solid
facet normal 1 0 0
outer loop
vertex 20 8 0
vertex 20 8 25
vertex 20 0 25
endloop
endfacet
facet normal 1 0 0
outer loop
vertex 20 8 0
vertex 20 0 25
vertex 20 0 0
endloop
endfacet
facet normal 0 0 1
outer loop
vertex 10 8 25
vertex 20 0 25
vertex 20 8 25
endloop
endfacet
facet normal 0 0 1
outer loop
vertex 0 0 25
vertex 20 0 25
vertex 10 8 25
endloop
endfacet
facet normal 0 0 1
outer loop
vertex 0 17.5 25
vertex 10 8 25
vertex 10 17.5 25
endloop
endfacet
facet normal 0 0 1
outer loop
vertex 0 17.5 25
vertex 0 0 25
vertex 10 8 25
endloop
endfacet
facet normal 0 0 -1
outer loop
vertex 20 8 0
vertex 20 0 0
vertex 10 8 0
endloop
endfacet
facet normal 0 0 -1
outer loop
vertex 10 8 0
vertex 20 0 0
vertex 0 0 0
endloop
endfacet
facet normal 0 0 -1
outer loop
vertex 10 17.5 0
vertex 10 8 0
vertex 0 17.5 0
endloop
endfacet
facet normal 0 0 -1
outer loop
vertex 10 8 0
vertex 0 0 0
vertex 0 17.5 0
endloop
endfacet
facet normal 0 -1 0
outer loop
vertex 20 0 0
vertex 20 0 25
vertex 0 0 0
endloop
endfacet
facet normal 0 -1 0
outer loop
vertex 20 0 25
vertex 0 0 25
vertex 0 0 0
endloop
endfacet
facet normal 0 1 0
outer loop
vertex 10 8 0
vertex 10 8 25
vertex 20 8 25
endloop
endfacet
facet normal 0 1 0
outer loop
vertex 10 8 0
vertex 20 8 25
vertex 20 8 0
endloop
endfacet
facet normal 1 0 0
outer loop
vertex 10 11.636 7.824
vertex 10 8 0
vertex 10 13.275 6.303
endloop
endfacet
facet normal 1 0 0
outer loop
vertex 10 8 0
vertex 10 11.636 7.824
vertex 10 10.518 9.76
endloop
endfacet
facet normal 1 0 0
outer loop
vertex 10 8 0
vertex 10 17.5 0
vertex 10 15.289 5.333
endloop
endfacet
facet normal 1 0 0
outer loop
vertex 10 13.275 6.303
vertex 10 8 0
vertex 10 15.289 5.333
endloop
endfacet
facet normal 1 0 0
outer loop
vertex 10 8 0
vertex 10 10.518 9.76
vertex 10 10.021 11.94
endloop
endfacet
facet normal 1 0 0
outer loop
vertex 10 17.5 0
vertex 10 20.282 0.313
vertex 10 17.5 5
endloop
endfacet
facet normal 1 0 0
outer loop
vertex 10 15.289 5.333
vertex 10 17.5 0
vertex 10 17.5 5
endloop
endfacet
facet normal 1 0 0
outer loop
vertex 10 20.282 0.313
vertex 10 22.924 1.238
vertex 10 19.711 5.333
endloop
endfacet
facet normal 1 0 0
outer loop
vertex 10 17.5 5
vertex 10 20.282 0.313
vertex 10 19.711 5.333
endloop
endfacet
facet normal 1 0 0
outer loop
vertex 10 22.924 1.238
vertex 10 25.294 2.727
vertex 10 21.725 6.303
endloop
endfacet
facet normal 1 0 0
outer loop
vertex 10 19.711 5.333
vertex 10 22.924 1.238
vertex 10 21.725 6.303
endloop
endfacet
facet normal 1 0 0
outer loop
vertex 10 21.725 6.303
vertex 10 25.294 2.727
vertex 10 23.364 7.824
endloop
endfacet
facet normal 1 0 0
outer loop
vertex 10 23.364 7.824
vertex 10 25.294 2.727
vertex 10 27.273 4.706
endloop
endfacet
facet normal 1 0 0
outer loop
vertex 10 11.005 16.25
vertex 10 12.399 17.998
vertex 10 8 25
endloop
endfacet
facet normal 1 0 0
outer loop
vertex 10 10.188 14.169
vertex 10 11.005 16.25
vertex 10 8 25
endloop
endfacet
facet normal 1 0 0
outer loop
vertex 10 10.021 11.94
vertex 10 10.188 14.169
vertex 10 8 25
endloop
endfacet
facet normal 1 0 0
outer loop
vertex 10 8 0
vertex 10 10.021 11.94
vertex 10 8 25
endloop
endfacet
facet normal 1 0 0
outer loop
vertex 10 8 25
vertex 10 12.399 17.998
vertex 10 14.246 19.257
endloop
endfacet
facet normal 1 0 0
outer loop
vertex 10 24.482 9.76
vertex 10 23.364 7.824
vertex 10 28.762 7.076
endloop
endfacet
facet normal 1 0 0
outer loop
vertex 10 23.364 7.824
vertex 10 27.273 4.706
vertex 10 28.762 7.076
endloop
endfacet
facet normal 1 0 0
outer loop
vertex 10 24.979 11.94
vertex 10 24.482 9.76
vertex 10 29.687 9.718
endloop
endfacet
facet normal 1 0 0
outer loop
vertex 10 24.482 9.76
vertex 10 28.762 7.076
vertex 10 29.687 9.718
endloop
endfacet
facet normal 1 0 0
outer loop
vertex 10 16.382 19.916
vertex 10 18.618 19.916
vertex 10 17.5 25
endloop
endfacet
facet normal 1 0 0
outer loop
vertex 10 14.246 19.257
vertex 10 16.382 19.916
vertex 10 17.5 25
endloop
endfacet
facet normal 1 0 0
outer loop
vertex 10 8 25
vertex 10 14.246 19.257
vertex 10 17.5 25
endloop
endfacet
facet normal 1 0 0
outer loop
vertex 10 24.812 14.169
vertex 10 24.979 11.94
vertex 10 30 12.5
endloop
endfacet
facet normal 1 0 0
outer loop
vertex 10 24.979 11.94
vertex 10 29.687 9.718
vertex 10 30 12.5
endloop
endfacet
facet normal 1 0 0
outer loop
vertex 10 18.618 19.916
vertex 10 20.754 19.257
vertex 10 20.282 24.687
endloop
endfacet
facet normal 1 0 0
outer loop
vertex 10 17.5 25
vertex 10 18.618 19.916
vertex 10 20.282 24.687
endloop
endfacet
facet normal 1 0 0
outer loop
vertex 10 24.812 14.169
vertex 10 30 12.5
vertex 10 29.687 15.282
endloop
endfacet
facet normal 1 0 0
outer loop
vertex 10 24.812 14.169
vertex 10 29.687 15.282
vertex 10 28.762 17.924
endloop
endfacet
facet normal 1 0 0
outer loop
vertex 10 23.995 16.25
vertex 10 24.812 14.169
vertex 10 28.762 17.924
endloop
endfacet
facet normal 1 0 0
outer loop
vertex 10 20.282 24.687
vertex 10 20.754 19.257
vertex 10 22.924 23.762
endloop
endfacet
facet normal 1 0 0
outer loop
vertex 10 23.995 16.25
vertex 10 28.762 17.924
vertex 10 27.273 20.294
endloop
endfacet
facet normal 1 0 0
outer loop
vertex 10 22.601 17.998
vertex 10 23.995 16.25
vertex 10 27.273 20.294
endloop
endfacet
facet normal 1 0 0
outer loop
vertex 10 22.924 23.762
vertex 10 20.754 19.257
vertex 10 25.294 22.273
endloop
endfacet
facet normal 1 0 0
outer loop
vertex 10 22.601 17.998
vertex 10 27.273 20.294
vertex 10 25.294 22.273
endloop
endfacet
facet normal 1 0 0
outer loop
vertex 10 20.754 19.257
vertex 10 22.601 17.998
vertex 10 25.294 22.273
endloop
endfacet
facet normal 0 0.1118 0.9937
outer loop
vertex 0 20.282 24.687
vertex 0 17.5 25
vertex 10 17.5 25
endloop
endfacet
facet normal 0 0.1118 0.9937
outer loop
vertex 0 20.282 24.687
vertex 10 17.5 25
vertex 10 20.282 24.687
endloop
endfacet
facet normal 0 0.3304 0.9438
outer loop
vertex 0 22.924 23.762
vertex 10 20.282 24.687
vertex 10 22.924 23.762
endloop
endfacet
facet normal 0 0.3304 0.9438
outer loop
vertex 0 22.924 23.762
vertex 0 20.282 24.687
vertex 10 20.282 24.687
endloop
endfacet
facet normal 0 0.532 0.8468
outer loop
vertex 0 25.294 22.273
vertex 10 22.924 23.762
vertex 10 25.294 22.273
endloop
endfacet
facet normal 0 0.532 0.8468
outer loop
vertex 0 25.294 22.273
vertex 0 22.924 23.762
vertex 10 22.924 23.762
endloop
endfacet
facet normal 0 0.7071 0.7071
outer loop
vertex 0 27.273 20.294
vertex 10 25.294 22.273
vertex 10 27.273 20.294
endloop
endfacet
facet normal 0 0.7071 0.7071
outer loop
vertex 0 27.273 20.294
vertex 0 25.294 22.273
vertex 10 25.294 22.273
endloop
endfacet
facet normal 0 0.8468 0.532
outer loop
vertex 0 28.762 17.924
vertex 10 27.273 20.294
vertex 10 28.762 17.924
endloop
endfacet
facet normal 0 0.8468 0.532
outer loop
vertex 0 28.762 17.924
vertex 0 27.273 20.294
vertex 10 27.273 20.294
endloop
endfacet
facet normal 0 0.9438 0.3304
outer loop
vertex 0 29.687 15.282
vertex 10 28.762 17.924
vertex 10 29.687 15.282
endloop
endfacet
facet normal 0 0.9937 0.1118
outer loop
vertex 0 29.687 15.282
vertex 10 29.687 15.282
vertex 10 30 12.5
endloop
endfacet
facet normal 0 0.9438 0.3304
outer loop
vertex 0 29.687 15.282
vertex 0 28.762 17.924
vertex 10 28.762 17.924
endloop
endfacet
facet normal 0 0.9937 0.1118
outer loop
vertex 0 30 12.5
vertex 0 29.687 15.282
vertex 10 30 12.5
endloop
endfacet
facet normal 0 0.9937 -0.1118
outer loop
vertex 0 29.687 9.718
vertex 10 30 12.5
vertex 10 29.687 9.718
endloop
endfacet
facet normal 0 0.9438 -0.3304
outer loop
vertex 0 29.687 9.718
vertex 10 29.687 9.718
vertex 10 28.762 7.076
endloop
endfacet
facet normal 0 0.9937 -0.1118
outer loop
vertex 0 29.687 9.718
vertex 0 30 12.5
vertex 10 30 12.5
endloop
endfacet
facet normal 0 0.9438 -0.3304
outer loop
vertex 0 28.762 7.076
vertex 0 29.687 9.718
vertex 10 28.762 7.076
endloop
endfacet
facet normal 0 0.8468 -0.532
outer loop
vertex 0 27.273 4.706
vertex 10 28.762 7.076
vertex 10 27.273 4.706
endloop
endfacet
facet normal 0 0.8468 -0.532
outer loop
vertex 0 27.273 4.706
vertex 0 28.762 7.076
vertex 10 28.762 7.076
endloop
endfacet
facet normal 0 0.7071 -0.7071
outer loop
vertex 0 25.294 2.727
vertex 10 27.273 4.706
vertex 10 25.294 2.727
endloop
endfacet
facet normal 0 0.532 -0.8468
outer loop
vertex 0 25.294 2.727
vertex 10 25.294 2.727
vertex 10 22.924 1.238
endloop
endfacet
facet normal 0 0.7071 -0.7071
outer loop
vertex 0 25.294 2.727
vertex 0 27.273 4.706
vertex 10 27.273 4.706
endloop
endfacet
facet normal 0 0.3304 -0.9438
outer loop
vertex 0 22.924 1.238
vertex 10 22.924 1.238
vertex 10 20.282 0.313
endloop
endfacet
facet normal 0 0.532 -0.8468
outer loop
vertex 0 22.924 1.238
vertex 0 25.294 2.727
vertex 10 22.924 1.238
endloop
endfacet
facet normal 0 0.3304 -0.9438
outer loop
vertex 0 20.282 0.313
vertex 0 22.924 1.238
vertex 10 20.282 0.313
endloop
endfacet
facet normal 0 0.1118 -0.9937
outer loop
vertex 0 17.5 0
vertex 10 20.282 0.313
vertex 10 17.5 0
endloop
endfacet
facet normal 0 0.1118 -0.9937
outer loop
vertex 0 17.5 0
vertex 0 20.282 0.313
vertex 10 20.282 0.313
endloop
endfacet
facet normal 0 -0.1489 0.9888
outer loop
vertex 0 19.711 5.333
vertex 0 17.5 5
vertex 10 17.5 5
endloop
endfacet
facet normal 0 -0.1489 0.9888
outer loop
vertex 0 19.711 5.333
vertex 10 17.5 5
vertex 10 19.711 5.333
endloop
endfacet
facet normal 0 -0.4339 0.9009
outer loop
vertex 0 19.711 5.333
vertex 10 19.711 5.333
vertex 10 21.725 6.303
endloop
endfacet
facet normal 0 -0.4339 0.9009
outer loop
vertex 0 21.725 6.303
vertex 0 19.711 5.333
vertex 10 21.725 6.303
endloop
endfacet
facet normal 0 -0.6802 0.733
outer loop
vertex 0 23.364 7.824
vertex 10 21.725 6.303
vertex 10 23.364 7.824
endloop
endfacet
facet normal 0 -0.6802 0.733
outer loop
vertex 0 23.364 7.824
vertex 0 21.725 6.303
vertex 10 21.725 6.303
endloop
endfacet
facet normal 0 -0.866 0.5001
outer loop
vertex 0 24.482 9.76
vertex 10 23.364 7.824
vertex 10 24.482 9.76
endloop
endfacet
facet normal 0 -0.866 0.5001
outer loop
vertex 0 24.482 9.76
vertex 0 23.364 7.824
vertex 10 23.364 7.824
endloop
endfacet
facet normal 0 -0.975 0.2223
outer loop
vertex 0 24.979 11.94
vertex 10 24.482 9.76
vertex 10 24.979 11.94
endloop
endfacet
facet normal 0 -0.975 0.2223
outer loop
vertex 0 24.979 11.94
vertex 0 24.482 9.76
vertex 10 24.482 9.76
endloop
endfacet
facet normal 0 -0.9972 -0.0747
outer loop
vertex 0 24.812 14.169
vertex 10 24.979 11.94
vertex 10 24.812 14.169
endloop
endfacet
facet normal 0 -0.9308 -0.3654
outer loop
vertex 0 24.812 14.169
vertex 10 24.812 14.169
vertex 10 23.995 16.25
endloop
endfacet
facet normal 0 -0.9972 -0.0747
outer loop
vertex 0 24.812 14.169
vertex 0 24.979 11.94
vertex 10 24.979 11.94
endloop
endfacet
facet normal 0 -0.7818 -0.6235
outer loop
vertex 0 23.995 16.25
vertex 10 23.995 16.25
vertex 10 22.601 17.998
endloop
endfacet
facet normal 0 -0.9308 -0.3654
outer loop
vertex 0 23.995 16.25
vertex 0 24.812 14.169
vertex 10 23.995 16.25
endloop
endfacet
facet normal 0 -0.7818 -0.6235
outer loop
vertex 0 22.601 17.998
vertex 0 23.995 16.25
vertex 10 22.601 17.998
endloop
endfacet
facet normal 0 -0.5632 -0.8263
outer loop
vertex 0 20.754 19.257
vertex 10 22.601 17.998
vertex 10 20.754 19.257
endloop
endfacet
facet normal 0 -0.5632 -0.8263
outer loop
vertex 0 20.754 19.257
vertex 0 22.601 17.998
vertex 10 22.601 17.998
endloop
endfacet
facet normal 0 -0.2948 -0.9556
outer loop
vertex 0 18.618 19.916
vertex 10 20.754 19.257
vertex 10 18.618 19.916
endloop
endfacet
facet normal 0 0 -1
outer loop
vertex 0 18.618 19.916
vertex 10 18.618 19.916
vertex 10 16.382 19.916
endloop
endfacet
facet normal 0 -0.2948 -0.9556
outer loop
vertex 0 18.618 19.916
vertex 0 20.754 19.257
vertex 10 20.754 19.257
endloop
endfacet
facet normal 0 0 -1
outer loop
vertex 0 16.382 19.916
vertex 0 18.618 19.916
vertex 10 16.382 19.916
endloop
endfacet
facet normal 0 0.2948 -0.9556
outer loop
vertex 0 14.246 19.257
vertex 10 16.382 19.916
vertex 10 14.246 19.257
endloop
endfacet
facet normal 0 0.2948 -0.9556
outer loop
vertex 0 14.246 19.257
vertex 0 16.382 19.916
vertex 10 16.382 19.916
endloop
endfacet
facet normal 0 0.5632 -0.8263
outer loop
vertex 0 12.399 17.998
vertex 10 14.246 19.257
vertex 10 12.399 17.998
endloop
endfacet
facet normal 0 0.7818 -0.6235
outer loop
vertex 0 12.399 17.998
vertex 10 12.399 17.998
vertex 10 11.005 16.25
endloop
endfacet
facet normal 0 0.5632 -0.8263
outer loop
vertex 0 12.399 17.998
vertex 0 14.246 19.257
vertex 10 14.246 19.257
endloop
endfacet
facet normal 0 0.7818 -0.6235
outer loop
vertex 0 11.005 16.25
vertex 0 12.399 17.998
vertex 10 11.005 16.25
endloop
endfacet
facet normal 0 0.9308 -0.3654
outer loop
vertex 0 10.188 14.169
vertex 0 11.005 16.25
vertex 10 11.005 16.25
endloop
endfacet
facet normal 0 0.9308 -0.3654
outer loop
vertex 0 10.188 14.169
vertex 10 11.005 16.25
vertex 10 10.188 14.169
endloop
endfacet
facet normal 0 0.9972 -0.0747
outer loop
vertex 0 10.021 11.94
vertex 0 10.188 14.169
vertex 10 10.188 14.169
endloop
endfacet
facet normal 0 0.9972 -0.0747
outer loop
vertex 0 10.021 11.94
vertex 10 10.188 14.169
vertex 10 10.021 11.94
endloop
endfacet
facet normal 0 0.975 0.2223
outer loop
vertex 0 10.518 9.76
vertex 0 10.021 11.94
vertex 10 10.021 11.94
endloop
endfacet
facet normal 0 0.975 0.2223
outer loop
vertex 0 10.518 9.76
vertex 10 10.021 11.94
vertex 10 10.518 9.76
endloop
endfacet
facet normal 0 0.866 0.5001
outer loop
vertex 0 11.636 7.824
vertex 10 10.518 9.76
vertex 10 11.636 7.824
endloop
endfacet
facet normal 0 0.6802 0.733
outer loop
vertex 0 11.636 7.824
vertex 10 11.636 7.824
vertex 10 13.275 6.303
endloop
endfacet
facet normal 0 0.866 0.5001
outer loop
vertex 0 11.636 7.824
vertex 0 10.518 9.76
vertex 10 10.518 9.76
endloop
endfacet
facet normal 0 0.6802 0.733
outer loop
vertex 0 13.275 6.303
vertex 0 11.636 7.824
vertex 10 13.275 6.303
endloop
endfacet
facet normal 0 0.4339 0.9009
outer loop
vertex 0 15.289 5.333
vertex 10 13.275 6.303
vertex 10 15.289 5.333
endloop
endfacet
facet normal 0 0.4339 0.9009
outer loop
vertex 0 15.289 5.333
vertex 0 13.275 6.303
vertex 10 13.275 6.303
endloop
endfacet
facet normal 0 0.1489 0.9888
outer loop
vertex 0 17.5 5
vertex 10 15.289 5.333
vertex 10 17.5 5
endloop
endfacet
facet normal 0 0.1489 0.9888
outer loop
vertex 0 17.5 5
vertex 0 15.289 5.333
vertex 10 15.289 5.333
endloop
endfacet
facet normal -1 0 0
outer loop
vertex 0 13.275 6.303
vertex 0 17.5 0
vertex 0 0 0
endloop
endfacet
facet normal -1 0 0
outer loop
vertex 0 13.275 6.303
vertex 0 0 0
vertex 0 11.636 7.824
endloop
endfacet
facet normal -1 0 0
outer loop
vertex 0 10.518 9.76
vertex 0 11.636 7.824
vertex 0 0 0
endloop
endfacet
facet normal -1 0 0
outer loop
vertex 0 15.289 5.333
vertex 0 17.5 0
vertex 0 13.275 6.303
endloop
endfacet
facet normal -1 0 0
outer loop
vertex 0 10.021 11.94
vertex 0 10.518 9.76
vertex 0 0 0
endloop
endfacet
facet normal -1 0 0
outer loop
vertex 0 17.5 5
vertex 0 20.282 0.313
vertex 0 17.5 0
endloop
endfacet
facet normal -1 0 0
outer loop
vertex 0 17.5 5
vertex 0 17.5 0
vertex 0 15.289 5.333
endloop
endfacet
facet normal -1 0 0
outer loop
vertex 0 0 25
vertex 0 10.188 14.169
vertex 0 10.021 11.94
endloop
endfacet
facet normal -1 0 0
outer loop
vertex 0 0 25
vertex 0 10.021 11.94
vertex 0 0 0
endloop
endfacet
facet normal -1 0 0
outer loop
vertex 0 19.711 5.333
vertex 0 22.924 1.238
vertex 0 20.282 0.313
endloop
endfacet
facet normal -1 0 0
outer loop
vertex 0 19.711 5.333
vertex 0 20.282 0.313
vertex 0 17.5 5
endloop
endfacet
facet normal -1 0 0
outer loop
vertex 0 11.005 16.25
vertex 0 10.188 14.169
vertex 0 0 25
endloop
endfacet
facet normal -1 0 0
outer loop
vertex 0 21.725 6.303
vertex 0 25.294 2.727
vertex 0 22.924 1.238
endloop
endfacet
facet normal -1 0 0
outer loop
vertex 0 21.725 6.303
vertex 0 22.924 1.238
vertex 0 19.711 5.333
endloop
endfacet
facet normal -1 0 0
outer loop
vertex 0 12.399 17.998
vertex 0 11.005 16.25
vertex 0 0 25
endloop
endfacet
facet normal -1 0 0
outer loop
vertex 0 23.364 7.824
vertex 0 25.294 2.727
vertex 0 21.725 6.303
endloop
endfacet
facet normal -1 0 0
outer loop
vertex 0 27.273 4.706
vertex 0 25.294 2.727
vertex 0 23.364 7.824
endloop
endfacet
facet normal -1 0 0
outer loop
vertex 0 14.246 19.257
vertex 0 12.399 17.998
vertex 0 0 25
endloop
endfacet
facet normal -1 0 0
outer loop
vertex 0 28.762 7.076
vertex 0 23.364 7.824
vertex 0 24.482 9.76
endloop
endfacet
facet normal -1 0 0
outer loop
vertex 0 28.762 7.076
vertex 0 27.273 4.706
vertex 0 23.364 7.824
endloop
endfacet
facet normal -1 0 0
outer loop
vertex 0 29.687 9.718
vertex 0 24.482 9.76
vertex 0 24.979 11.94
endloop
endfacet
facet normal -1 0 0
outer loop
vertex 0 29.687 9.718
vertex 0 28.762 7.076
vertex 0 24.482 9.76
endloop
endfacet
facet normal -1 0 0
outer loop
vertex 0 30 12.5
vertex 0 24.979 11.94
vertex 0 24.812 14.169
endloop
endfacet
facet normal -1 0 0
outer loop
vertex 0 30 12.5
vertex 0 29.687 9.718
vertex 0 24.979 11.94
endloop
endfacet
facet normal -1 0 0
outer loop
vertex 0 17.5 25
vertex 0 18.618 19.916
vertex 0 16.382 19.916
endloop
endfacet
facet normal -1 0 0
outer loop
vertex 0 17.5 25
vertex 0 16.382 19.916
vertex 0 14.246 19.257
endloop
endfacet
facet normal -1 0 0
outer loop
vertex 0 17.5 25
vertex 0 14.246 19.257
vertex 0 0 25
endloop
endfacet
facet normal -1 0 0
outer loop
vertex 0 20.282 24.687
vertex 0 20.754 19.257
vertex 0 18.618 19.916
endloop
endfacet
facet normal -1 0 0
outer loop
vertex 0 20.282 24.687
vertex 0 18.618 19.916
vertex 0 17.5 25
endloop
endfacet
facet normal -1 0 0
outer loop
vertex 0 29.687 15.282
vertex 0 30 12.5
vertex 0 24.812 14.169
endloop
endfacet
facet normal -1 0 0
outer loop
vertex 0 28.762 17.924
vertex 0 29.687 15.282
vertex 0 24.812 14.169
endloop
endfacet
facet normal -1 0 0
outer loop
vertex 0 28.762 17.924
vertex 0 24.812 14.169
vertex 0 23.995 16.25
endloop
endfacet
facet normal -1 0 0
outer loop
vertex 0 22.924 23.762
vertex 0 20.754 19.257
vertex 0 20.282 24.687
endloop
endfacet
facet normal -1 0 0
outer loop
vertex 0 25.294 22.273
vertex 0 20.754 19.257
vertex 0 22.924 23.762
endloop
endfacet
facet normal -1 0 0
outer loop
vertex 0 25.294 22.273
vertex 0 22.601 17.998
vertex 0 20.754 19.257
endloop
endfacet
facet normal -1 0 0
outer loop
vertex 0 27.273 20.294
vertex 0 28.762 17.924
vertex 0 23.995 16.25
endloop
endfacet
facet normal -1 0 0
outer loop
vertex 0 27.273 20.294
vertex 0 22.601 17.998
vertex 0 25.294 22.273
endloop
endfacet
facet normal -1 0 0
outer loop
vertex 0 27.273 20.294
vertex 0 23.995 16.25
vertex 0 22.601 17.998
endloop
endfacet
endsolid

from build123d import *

# Parameters (mm, degrees)
CROQUIS1_R              = 7.5
SALIENTE_EXTRUIR1_DEPTH = 10
CROQUIS2_W              = 25
CROQUIS2_H              = 8
SALIENTE_EXTRUIR2_DEPTH = 10


with BuildPart() as part:
    # Croquis1 → Saliente-Extruir1 (new body)
    with BuildSketch(Plane(origin=(0, 0, 0), x_dir=(0, 0, -1), z_dir=(1, 0, 0))):
        with BuildLine():
            Line((0, 0), (-25, 0))
            Line((-25, 0), (-25, 17.5))
            ThreePointArc((-25, 17.5), (-12.5, 30), (0, 17.5))
            Line((0, 17.5), (0, 0))
        make_face()
        with Locations((-12.5, 17.5)):
            Circle(CROQUIS1_R, mode=Mode.SUBTRACT)
    extrude(amount=SALIENTE_EXTRUIR1_DEPTH)

    # Croquis2 → Saliente-Extruir2 (add)
    with BuildSketch(Plane(origin=(10, 0, 0), x_dir=(0, 0, -1), z_dir=(1, 0, 0))):
        with Locations((-12.5, 4)):
            Rectangle(CROQUIS2_W, CROQUIS2_H)
    extrude(amount=SALIENTE_EXTRUIR2_DEPTH)


solid = part.part
